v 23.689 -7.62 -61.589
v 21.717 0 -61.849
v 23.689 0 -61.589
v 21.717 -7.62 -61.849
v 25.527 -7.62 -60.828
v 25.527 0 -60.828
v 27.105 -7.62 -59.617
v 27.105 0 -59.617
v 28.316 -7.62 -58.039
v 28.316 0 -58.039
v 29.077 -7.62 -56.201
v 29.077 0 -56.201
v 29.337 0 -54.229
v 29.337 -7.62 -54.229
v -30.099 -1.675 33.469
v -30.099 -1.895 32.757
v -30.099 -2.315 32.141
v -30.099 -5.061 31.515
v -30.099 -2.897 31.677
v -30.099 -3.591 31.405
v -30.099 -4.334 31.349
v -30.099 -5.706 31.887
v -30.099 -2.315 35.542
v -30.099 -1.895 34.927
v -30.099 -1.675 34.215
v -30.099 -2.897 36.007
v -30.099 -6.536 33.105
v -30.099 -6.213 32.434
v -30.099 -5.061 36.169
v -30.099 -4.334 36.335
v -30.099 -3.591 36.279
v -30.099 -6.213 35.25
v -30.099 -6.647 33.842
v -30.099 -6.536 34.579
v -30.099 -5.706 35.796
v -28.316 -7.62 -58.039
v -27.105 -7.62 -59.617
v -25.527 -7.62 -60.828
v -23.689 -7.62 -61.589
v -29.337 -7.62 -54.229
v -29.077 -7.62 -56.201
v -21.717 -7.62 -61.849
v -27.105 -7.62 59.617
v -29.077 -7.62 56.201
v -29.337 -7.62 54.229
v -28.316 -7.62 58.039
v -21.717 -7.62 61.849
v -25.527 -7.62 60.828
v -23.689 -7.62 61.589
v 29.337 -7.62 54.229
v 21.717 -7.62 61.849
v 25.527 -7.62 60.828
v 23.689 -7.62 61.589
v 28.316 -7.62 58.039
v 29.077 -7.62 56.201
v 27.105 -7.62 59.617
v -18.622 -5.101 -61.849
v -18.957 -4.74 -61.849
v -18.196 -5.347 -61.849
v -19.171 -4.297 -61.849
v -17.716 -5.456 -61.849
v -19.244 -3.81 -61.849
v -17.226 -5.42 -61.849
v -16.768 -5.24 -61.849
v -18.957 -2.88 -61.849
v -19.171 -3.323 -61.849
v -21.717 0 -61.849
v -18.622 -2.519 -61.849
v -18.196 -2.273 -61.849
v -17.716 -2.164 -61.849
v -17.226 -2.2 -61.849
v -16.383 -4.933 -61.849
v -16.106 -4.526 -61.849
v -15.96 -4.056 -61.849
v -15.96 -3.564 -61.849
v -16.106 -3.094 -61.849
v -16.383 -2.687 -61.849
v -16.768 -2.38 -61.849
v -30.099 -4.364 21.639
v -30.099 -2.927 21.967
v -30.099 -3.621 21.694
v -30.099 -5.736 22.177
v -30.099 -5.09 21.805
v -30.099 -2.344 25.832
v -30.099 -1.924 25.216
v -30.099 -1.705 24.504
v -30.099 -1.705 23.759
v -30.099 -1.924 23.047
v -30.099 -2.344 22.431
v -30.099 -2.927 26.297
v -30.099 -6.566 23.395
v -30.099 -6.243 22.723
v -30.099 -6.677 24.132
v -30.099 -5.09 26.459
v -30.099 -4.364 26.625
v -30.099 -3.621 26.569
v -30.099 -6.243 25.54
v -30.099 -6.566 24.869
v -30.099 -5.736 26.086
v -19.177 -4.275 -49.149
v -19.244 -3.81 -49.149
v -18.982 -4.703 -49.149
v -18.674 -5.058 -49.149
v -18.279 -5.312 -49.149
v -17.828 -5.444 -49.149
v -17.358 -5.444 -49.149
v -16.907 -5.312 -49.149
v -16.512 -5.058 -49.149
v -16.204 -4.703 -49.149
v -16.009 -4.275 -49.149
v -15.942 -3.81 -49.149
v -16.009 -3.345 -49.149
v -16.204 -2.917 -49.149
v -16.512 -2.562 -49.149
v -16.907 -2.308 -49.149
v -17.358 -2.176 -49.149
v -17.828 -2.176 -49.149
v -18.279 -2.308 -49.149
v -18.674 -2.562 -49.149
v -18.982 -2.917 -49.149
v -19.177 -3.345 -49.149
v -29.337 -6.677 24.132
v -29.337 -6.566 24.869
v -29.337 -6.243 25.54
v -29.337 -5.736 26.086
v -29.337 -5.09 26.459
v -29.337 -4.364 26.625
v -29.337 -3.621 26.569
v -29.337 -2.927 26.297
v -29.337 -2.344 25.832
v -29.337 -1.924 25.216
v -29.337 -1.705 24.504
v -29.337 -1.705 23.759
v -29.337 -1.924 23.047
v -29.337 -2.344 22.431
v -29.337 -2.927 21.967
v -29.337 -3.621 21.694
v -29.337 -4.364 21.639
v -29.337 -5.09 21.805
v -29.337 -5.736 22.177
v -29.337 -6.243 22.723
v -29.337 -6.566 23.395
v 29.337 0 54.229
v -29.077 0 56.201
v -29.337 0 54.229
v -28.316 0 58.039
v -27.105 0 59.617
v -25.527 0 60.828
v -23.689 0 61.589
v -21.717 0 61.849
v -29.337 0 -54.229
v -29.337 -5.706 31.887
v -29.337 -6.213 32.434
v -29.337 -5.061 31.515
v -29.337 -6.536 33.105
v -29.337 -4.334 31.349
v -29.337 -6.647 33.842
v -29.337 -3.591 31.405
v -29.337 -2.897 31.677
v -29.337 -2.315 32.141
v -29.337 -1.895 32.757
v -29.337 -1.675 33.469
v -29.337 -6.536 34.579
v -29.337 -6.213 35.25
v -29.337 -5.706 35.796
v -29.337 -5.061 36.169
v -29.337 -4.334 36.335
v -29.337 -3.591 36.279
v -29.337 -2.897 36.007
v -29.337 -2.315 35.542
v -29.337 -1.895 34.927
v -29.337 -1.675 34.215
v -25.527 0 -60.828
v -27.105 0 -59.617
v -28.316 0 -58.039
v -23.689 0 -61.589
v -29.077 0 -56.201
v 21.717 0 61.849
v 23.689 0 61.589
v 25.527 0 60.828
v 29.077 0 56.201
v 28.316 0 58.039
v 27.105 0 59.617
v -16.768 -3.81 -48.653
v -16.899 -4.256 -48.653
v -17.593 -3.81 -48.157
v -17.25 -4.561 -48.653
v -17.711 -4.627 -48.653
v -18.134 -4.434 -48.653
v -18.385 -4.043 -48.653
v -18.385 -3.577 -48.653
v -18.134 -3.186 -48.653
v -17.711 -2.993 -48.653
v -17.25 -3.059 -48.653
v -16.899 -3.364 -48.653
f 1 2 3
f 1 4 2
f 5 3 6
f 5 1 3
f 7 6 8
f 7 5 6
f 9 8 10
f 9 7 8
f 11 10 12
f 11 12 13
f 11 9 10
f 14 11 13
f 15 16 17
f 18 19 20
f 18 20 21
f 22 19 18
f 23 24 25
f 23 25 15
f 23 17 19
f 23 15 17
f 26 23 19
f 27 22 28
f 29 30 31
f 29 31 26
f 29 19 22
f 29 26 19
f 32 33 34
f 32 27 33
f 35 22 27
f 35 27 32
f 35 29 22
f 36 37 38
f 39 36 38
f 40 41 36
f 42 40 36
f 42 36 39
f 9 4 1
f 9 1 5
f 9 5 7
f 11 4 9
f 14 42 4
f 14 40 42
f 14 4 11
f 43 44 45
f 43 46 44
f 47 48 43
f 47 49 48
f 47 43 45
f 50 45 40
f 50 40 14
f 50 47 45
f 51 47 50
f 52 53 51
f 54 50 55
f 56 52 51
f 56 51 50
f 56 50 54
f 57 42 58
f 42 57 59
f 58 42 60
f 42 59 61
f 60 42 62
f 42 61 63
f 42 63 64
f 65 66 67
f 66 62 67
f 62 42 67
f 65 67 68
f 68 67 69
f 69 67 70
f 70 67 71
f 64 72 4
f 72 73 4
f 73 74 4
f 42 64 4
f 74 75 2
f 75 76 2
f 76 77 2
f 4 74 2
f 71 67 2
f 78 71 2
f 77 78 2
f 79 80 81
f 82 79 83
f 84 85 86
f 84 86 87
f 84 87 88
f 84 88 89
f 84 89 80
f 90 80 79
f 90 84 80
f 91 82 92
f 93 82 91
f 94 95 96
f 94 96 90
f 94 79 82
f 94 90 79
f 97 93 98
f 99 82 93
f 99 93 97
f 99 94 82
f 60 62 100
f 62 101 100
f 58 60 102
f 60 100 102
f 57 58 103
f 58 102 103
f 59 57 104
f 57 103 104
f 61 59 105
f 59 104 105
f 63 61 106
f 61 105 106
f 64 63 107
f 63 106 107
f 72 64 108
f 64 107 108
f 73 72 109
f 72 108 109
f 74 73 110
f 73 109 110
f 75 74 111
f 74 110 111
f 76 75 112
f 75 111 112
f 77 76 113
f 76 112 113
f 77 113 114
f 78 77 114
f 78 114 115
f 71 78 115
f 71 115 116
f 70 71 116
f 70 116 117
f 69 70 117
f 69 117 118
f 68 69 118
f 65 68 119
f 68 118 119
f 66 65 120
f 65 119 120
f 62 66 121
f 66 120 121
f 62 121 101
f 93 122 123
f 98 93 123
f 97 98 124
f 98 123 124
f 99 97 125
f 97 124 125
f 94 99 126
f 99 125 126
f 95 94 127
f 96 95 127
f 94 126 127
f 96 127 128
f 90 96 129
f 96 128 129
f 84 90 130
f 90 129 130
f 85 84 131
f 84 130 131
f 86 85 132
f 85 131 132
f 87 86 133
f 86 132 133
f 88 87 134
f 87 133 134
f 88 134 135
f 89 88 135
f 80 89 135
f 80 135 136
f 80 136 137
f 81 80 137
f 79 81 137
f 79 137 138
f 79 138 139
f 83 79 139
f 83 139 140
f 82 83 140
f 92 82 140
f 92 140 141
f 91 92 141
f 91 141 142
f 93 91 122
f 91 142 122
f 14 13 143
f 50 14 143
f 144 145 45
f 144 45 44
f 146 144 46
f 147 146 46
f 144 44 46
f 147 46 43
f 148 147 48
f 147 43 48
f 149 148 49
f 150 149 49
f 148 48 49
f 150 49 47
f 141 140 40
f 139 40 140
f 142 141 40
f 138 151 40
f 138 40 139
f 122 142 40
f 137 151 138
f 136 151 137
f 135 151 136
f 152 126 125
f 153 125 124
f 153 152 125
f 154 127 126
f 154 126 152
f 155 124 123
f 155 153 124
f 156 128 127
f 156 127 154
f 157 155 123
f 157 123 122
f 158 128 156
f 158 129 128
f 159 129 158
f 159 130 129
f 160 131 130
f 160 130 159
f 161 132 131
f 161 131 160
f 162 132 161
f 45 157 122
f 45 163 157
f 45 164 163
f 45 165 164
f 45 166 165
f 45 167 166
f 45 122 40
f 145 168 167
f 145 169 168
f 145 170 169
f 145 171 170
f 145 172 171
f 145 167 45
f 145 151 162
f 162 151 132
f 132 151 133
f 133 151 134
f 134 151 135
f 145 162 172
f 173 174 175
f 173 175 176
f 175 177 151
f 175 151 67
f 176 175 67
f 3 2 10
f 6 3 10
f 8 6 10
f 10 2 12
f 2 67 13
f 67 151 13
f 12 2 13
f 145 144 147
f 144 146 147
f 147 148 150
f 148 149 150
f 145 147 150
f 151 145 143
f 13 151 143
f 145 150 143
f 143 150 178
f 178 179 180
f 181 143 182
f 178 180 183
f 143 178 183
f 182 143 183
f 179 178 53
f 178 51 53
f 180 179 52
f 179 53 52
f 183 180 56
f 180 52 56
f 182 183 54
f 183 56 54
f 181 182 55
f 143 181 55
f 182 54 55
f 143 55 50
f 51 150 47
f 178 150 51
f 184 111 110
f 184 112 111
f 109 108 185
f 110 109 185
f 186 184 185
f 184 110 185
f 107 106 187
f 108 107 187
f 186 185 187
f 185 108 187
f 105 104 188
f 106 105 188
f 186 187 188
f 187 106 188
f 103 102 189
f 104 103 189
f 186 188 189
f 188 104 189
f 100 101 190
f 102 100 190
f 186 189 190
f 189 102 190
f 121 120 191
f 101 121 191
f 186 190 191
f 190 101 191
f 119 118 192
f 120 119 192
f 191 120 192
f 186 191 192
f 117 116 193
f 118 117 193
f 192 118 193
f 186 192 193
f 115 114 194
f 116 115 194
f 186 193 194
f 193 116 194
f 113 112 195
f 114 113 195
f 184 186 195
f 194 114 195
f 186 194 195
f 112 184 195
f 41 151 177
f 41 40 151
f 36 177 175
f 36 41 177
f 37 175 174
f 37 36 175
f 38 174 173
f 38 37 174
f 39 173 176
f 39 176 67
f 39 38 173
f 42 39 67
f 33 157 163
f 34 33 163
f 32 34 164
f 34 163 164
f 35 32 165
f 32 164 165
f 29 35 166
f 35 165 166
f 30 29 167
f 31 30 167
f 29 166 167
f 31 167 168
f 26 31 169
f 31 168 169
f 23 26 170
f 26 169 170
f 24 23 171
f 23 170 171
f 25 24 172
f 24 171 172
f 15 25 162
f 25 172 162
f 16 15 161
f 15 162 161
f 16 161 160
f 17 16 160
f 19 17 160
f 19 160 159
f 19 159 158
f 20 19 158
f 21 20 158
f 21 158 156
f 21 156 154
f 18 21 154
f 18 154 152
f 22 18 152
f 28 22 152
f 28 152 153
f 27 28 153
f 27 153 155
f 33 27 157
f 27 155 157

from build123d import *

# Parameters (mm, degrees)
F0_W      = 58.674
F0_H      = 123.698
F0_W_2    = 51.5999984
F0_H_2    = 90.24999984
F1_DEPTH  = 7.62
F2_DEPTH  = 7.62
F3_R      = 7.62
F4_R      = 2.499995
F5_DEPTH  = 0.762
F6_DEPTH  = 0.762
F4_W      = 3.5058120266
F4_H      = 8.0789849162
F7_DEPTH  = 2.54
F8_R      = 1.867115094
F9_DEPTH  = 11.43
F10_D     = 3.302
F10_DEPTH = 12.7
F10_TIP   = 0.992020882


with BuildPart() as f1:
    # F0 (on Front) → F1 (new body)
    with BuildSketch(Plane.XZ):
        Rectangle(F0_W, F0_H)
        Rectangle(F0_W_2, F0_H_2, mode=Mode.SUBTRACT)
    extrude(amount=F1_DEPTH)

    # F0 (on Front) → F2 (join)
    with BuildSketch(Plane.XZ):
        Rectangle(F0_W_2, F0_H_2)
    extrude(amount=F2_DEPTH)

    # F3
    f3_edges = [f1.edges().sort_by_distance(p)[0] for p in [
        (29.337, -3.81, 61.849),
        (29.337, -3.81, -61.849),
        (-29.337, -3.81, -61.849),
        (-29.337, -3.81, 61.849),
    ]]
    fillet(f3_edges, radius=F3_R)

    # F4 (on face) → F5 (join)
    with BuildSketch(Plane(origin=(-29.337, 0, 0), x_dir=(0, -1, 0), z_dir=(-1, 0, 0))):
        with Locations((4.176910501, 24.1317823529)):
            Circle(F4_R)
    extrude(amount=F5_DEPTH)

    # F4 (on face) → F6 (join)
    with BuildSketch(Plane(origin=(-29.337, 0, 0), x_dir=(0, -1, 0), z_dir=(-1, 0, 0))):
        with Locations((4.1472632438, 33.8419191539)):
            Circle(F4_R)
    extrude(amount=F6_DEPTH)

    # F4 (on face) → F7 (join)
    with BuildSketch(Plane(origin=(-29.337, 0, 0), x_dir=(0, -1, 0), z_dir=(-1, 0, 0))):
        with Locations((4.1351062246, 46.2057814002)):
            Rectangle(F4_W, F4_H)
    extrude(amount=-F7_DEPTH)

    # F8 (on face) → F9 (join)
    with BuildSketch(Plane(origin=(0, 0, -61.849), x_dir=(1, 0, 0), z_dir=(0, 0, -1))):
        with Locations((-17.5930447876, 3.81)):
            Circle(F8_R)
    extrude(amount=-F9_DEPTH)

    # F10
    with Locations(Plane(origin=(0, 0, -61.849), x_dir=(1, 0, 0), z_dir=(0, 0, -1))):
        with Locations((-17.5930447876, 3.81)):
            Hole(F10_D / 2, depth=F10_DEPTH)
            with Locations((0, 0, -(F10_DEPTH + F10_TIP / 2))):  # 118° drill point
                Cone(0, F10_D / 2, F10_TIP, mode=Mode.SUBTRACT)


solid = f1.part
